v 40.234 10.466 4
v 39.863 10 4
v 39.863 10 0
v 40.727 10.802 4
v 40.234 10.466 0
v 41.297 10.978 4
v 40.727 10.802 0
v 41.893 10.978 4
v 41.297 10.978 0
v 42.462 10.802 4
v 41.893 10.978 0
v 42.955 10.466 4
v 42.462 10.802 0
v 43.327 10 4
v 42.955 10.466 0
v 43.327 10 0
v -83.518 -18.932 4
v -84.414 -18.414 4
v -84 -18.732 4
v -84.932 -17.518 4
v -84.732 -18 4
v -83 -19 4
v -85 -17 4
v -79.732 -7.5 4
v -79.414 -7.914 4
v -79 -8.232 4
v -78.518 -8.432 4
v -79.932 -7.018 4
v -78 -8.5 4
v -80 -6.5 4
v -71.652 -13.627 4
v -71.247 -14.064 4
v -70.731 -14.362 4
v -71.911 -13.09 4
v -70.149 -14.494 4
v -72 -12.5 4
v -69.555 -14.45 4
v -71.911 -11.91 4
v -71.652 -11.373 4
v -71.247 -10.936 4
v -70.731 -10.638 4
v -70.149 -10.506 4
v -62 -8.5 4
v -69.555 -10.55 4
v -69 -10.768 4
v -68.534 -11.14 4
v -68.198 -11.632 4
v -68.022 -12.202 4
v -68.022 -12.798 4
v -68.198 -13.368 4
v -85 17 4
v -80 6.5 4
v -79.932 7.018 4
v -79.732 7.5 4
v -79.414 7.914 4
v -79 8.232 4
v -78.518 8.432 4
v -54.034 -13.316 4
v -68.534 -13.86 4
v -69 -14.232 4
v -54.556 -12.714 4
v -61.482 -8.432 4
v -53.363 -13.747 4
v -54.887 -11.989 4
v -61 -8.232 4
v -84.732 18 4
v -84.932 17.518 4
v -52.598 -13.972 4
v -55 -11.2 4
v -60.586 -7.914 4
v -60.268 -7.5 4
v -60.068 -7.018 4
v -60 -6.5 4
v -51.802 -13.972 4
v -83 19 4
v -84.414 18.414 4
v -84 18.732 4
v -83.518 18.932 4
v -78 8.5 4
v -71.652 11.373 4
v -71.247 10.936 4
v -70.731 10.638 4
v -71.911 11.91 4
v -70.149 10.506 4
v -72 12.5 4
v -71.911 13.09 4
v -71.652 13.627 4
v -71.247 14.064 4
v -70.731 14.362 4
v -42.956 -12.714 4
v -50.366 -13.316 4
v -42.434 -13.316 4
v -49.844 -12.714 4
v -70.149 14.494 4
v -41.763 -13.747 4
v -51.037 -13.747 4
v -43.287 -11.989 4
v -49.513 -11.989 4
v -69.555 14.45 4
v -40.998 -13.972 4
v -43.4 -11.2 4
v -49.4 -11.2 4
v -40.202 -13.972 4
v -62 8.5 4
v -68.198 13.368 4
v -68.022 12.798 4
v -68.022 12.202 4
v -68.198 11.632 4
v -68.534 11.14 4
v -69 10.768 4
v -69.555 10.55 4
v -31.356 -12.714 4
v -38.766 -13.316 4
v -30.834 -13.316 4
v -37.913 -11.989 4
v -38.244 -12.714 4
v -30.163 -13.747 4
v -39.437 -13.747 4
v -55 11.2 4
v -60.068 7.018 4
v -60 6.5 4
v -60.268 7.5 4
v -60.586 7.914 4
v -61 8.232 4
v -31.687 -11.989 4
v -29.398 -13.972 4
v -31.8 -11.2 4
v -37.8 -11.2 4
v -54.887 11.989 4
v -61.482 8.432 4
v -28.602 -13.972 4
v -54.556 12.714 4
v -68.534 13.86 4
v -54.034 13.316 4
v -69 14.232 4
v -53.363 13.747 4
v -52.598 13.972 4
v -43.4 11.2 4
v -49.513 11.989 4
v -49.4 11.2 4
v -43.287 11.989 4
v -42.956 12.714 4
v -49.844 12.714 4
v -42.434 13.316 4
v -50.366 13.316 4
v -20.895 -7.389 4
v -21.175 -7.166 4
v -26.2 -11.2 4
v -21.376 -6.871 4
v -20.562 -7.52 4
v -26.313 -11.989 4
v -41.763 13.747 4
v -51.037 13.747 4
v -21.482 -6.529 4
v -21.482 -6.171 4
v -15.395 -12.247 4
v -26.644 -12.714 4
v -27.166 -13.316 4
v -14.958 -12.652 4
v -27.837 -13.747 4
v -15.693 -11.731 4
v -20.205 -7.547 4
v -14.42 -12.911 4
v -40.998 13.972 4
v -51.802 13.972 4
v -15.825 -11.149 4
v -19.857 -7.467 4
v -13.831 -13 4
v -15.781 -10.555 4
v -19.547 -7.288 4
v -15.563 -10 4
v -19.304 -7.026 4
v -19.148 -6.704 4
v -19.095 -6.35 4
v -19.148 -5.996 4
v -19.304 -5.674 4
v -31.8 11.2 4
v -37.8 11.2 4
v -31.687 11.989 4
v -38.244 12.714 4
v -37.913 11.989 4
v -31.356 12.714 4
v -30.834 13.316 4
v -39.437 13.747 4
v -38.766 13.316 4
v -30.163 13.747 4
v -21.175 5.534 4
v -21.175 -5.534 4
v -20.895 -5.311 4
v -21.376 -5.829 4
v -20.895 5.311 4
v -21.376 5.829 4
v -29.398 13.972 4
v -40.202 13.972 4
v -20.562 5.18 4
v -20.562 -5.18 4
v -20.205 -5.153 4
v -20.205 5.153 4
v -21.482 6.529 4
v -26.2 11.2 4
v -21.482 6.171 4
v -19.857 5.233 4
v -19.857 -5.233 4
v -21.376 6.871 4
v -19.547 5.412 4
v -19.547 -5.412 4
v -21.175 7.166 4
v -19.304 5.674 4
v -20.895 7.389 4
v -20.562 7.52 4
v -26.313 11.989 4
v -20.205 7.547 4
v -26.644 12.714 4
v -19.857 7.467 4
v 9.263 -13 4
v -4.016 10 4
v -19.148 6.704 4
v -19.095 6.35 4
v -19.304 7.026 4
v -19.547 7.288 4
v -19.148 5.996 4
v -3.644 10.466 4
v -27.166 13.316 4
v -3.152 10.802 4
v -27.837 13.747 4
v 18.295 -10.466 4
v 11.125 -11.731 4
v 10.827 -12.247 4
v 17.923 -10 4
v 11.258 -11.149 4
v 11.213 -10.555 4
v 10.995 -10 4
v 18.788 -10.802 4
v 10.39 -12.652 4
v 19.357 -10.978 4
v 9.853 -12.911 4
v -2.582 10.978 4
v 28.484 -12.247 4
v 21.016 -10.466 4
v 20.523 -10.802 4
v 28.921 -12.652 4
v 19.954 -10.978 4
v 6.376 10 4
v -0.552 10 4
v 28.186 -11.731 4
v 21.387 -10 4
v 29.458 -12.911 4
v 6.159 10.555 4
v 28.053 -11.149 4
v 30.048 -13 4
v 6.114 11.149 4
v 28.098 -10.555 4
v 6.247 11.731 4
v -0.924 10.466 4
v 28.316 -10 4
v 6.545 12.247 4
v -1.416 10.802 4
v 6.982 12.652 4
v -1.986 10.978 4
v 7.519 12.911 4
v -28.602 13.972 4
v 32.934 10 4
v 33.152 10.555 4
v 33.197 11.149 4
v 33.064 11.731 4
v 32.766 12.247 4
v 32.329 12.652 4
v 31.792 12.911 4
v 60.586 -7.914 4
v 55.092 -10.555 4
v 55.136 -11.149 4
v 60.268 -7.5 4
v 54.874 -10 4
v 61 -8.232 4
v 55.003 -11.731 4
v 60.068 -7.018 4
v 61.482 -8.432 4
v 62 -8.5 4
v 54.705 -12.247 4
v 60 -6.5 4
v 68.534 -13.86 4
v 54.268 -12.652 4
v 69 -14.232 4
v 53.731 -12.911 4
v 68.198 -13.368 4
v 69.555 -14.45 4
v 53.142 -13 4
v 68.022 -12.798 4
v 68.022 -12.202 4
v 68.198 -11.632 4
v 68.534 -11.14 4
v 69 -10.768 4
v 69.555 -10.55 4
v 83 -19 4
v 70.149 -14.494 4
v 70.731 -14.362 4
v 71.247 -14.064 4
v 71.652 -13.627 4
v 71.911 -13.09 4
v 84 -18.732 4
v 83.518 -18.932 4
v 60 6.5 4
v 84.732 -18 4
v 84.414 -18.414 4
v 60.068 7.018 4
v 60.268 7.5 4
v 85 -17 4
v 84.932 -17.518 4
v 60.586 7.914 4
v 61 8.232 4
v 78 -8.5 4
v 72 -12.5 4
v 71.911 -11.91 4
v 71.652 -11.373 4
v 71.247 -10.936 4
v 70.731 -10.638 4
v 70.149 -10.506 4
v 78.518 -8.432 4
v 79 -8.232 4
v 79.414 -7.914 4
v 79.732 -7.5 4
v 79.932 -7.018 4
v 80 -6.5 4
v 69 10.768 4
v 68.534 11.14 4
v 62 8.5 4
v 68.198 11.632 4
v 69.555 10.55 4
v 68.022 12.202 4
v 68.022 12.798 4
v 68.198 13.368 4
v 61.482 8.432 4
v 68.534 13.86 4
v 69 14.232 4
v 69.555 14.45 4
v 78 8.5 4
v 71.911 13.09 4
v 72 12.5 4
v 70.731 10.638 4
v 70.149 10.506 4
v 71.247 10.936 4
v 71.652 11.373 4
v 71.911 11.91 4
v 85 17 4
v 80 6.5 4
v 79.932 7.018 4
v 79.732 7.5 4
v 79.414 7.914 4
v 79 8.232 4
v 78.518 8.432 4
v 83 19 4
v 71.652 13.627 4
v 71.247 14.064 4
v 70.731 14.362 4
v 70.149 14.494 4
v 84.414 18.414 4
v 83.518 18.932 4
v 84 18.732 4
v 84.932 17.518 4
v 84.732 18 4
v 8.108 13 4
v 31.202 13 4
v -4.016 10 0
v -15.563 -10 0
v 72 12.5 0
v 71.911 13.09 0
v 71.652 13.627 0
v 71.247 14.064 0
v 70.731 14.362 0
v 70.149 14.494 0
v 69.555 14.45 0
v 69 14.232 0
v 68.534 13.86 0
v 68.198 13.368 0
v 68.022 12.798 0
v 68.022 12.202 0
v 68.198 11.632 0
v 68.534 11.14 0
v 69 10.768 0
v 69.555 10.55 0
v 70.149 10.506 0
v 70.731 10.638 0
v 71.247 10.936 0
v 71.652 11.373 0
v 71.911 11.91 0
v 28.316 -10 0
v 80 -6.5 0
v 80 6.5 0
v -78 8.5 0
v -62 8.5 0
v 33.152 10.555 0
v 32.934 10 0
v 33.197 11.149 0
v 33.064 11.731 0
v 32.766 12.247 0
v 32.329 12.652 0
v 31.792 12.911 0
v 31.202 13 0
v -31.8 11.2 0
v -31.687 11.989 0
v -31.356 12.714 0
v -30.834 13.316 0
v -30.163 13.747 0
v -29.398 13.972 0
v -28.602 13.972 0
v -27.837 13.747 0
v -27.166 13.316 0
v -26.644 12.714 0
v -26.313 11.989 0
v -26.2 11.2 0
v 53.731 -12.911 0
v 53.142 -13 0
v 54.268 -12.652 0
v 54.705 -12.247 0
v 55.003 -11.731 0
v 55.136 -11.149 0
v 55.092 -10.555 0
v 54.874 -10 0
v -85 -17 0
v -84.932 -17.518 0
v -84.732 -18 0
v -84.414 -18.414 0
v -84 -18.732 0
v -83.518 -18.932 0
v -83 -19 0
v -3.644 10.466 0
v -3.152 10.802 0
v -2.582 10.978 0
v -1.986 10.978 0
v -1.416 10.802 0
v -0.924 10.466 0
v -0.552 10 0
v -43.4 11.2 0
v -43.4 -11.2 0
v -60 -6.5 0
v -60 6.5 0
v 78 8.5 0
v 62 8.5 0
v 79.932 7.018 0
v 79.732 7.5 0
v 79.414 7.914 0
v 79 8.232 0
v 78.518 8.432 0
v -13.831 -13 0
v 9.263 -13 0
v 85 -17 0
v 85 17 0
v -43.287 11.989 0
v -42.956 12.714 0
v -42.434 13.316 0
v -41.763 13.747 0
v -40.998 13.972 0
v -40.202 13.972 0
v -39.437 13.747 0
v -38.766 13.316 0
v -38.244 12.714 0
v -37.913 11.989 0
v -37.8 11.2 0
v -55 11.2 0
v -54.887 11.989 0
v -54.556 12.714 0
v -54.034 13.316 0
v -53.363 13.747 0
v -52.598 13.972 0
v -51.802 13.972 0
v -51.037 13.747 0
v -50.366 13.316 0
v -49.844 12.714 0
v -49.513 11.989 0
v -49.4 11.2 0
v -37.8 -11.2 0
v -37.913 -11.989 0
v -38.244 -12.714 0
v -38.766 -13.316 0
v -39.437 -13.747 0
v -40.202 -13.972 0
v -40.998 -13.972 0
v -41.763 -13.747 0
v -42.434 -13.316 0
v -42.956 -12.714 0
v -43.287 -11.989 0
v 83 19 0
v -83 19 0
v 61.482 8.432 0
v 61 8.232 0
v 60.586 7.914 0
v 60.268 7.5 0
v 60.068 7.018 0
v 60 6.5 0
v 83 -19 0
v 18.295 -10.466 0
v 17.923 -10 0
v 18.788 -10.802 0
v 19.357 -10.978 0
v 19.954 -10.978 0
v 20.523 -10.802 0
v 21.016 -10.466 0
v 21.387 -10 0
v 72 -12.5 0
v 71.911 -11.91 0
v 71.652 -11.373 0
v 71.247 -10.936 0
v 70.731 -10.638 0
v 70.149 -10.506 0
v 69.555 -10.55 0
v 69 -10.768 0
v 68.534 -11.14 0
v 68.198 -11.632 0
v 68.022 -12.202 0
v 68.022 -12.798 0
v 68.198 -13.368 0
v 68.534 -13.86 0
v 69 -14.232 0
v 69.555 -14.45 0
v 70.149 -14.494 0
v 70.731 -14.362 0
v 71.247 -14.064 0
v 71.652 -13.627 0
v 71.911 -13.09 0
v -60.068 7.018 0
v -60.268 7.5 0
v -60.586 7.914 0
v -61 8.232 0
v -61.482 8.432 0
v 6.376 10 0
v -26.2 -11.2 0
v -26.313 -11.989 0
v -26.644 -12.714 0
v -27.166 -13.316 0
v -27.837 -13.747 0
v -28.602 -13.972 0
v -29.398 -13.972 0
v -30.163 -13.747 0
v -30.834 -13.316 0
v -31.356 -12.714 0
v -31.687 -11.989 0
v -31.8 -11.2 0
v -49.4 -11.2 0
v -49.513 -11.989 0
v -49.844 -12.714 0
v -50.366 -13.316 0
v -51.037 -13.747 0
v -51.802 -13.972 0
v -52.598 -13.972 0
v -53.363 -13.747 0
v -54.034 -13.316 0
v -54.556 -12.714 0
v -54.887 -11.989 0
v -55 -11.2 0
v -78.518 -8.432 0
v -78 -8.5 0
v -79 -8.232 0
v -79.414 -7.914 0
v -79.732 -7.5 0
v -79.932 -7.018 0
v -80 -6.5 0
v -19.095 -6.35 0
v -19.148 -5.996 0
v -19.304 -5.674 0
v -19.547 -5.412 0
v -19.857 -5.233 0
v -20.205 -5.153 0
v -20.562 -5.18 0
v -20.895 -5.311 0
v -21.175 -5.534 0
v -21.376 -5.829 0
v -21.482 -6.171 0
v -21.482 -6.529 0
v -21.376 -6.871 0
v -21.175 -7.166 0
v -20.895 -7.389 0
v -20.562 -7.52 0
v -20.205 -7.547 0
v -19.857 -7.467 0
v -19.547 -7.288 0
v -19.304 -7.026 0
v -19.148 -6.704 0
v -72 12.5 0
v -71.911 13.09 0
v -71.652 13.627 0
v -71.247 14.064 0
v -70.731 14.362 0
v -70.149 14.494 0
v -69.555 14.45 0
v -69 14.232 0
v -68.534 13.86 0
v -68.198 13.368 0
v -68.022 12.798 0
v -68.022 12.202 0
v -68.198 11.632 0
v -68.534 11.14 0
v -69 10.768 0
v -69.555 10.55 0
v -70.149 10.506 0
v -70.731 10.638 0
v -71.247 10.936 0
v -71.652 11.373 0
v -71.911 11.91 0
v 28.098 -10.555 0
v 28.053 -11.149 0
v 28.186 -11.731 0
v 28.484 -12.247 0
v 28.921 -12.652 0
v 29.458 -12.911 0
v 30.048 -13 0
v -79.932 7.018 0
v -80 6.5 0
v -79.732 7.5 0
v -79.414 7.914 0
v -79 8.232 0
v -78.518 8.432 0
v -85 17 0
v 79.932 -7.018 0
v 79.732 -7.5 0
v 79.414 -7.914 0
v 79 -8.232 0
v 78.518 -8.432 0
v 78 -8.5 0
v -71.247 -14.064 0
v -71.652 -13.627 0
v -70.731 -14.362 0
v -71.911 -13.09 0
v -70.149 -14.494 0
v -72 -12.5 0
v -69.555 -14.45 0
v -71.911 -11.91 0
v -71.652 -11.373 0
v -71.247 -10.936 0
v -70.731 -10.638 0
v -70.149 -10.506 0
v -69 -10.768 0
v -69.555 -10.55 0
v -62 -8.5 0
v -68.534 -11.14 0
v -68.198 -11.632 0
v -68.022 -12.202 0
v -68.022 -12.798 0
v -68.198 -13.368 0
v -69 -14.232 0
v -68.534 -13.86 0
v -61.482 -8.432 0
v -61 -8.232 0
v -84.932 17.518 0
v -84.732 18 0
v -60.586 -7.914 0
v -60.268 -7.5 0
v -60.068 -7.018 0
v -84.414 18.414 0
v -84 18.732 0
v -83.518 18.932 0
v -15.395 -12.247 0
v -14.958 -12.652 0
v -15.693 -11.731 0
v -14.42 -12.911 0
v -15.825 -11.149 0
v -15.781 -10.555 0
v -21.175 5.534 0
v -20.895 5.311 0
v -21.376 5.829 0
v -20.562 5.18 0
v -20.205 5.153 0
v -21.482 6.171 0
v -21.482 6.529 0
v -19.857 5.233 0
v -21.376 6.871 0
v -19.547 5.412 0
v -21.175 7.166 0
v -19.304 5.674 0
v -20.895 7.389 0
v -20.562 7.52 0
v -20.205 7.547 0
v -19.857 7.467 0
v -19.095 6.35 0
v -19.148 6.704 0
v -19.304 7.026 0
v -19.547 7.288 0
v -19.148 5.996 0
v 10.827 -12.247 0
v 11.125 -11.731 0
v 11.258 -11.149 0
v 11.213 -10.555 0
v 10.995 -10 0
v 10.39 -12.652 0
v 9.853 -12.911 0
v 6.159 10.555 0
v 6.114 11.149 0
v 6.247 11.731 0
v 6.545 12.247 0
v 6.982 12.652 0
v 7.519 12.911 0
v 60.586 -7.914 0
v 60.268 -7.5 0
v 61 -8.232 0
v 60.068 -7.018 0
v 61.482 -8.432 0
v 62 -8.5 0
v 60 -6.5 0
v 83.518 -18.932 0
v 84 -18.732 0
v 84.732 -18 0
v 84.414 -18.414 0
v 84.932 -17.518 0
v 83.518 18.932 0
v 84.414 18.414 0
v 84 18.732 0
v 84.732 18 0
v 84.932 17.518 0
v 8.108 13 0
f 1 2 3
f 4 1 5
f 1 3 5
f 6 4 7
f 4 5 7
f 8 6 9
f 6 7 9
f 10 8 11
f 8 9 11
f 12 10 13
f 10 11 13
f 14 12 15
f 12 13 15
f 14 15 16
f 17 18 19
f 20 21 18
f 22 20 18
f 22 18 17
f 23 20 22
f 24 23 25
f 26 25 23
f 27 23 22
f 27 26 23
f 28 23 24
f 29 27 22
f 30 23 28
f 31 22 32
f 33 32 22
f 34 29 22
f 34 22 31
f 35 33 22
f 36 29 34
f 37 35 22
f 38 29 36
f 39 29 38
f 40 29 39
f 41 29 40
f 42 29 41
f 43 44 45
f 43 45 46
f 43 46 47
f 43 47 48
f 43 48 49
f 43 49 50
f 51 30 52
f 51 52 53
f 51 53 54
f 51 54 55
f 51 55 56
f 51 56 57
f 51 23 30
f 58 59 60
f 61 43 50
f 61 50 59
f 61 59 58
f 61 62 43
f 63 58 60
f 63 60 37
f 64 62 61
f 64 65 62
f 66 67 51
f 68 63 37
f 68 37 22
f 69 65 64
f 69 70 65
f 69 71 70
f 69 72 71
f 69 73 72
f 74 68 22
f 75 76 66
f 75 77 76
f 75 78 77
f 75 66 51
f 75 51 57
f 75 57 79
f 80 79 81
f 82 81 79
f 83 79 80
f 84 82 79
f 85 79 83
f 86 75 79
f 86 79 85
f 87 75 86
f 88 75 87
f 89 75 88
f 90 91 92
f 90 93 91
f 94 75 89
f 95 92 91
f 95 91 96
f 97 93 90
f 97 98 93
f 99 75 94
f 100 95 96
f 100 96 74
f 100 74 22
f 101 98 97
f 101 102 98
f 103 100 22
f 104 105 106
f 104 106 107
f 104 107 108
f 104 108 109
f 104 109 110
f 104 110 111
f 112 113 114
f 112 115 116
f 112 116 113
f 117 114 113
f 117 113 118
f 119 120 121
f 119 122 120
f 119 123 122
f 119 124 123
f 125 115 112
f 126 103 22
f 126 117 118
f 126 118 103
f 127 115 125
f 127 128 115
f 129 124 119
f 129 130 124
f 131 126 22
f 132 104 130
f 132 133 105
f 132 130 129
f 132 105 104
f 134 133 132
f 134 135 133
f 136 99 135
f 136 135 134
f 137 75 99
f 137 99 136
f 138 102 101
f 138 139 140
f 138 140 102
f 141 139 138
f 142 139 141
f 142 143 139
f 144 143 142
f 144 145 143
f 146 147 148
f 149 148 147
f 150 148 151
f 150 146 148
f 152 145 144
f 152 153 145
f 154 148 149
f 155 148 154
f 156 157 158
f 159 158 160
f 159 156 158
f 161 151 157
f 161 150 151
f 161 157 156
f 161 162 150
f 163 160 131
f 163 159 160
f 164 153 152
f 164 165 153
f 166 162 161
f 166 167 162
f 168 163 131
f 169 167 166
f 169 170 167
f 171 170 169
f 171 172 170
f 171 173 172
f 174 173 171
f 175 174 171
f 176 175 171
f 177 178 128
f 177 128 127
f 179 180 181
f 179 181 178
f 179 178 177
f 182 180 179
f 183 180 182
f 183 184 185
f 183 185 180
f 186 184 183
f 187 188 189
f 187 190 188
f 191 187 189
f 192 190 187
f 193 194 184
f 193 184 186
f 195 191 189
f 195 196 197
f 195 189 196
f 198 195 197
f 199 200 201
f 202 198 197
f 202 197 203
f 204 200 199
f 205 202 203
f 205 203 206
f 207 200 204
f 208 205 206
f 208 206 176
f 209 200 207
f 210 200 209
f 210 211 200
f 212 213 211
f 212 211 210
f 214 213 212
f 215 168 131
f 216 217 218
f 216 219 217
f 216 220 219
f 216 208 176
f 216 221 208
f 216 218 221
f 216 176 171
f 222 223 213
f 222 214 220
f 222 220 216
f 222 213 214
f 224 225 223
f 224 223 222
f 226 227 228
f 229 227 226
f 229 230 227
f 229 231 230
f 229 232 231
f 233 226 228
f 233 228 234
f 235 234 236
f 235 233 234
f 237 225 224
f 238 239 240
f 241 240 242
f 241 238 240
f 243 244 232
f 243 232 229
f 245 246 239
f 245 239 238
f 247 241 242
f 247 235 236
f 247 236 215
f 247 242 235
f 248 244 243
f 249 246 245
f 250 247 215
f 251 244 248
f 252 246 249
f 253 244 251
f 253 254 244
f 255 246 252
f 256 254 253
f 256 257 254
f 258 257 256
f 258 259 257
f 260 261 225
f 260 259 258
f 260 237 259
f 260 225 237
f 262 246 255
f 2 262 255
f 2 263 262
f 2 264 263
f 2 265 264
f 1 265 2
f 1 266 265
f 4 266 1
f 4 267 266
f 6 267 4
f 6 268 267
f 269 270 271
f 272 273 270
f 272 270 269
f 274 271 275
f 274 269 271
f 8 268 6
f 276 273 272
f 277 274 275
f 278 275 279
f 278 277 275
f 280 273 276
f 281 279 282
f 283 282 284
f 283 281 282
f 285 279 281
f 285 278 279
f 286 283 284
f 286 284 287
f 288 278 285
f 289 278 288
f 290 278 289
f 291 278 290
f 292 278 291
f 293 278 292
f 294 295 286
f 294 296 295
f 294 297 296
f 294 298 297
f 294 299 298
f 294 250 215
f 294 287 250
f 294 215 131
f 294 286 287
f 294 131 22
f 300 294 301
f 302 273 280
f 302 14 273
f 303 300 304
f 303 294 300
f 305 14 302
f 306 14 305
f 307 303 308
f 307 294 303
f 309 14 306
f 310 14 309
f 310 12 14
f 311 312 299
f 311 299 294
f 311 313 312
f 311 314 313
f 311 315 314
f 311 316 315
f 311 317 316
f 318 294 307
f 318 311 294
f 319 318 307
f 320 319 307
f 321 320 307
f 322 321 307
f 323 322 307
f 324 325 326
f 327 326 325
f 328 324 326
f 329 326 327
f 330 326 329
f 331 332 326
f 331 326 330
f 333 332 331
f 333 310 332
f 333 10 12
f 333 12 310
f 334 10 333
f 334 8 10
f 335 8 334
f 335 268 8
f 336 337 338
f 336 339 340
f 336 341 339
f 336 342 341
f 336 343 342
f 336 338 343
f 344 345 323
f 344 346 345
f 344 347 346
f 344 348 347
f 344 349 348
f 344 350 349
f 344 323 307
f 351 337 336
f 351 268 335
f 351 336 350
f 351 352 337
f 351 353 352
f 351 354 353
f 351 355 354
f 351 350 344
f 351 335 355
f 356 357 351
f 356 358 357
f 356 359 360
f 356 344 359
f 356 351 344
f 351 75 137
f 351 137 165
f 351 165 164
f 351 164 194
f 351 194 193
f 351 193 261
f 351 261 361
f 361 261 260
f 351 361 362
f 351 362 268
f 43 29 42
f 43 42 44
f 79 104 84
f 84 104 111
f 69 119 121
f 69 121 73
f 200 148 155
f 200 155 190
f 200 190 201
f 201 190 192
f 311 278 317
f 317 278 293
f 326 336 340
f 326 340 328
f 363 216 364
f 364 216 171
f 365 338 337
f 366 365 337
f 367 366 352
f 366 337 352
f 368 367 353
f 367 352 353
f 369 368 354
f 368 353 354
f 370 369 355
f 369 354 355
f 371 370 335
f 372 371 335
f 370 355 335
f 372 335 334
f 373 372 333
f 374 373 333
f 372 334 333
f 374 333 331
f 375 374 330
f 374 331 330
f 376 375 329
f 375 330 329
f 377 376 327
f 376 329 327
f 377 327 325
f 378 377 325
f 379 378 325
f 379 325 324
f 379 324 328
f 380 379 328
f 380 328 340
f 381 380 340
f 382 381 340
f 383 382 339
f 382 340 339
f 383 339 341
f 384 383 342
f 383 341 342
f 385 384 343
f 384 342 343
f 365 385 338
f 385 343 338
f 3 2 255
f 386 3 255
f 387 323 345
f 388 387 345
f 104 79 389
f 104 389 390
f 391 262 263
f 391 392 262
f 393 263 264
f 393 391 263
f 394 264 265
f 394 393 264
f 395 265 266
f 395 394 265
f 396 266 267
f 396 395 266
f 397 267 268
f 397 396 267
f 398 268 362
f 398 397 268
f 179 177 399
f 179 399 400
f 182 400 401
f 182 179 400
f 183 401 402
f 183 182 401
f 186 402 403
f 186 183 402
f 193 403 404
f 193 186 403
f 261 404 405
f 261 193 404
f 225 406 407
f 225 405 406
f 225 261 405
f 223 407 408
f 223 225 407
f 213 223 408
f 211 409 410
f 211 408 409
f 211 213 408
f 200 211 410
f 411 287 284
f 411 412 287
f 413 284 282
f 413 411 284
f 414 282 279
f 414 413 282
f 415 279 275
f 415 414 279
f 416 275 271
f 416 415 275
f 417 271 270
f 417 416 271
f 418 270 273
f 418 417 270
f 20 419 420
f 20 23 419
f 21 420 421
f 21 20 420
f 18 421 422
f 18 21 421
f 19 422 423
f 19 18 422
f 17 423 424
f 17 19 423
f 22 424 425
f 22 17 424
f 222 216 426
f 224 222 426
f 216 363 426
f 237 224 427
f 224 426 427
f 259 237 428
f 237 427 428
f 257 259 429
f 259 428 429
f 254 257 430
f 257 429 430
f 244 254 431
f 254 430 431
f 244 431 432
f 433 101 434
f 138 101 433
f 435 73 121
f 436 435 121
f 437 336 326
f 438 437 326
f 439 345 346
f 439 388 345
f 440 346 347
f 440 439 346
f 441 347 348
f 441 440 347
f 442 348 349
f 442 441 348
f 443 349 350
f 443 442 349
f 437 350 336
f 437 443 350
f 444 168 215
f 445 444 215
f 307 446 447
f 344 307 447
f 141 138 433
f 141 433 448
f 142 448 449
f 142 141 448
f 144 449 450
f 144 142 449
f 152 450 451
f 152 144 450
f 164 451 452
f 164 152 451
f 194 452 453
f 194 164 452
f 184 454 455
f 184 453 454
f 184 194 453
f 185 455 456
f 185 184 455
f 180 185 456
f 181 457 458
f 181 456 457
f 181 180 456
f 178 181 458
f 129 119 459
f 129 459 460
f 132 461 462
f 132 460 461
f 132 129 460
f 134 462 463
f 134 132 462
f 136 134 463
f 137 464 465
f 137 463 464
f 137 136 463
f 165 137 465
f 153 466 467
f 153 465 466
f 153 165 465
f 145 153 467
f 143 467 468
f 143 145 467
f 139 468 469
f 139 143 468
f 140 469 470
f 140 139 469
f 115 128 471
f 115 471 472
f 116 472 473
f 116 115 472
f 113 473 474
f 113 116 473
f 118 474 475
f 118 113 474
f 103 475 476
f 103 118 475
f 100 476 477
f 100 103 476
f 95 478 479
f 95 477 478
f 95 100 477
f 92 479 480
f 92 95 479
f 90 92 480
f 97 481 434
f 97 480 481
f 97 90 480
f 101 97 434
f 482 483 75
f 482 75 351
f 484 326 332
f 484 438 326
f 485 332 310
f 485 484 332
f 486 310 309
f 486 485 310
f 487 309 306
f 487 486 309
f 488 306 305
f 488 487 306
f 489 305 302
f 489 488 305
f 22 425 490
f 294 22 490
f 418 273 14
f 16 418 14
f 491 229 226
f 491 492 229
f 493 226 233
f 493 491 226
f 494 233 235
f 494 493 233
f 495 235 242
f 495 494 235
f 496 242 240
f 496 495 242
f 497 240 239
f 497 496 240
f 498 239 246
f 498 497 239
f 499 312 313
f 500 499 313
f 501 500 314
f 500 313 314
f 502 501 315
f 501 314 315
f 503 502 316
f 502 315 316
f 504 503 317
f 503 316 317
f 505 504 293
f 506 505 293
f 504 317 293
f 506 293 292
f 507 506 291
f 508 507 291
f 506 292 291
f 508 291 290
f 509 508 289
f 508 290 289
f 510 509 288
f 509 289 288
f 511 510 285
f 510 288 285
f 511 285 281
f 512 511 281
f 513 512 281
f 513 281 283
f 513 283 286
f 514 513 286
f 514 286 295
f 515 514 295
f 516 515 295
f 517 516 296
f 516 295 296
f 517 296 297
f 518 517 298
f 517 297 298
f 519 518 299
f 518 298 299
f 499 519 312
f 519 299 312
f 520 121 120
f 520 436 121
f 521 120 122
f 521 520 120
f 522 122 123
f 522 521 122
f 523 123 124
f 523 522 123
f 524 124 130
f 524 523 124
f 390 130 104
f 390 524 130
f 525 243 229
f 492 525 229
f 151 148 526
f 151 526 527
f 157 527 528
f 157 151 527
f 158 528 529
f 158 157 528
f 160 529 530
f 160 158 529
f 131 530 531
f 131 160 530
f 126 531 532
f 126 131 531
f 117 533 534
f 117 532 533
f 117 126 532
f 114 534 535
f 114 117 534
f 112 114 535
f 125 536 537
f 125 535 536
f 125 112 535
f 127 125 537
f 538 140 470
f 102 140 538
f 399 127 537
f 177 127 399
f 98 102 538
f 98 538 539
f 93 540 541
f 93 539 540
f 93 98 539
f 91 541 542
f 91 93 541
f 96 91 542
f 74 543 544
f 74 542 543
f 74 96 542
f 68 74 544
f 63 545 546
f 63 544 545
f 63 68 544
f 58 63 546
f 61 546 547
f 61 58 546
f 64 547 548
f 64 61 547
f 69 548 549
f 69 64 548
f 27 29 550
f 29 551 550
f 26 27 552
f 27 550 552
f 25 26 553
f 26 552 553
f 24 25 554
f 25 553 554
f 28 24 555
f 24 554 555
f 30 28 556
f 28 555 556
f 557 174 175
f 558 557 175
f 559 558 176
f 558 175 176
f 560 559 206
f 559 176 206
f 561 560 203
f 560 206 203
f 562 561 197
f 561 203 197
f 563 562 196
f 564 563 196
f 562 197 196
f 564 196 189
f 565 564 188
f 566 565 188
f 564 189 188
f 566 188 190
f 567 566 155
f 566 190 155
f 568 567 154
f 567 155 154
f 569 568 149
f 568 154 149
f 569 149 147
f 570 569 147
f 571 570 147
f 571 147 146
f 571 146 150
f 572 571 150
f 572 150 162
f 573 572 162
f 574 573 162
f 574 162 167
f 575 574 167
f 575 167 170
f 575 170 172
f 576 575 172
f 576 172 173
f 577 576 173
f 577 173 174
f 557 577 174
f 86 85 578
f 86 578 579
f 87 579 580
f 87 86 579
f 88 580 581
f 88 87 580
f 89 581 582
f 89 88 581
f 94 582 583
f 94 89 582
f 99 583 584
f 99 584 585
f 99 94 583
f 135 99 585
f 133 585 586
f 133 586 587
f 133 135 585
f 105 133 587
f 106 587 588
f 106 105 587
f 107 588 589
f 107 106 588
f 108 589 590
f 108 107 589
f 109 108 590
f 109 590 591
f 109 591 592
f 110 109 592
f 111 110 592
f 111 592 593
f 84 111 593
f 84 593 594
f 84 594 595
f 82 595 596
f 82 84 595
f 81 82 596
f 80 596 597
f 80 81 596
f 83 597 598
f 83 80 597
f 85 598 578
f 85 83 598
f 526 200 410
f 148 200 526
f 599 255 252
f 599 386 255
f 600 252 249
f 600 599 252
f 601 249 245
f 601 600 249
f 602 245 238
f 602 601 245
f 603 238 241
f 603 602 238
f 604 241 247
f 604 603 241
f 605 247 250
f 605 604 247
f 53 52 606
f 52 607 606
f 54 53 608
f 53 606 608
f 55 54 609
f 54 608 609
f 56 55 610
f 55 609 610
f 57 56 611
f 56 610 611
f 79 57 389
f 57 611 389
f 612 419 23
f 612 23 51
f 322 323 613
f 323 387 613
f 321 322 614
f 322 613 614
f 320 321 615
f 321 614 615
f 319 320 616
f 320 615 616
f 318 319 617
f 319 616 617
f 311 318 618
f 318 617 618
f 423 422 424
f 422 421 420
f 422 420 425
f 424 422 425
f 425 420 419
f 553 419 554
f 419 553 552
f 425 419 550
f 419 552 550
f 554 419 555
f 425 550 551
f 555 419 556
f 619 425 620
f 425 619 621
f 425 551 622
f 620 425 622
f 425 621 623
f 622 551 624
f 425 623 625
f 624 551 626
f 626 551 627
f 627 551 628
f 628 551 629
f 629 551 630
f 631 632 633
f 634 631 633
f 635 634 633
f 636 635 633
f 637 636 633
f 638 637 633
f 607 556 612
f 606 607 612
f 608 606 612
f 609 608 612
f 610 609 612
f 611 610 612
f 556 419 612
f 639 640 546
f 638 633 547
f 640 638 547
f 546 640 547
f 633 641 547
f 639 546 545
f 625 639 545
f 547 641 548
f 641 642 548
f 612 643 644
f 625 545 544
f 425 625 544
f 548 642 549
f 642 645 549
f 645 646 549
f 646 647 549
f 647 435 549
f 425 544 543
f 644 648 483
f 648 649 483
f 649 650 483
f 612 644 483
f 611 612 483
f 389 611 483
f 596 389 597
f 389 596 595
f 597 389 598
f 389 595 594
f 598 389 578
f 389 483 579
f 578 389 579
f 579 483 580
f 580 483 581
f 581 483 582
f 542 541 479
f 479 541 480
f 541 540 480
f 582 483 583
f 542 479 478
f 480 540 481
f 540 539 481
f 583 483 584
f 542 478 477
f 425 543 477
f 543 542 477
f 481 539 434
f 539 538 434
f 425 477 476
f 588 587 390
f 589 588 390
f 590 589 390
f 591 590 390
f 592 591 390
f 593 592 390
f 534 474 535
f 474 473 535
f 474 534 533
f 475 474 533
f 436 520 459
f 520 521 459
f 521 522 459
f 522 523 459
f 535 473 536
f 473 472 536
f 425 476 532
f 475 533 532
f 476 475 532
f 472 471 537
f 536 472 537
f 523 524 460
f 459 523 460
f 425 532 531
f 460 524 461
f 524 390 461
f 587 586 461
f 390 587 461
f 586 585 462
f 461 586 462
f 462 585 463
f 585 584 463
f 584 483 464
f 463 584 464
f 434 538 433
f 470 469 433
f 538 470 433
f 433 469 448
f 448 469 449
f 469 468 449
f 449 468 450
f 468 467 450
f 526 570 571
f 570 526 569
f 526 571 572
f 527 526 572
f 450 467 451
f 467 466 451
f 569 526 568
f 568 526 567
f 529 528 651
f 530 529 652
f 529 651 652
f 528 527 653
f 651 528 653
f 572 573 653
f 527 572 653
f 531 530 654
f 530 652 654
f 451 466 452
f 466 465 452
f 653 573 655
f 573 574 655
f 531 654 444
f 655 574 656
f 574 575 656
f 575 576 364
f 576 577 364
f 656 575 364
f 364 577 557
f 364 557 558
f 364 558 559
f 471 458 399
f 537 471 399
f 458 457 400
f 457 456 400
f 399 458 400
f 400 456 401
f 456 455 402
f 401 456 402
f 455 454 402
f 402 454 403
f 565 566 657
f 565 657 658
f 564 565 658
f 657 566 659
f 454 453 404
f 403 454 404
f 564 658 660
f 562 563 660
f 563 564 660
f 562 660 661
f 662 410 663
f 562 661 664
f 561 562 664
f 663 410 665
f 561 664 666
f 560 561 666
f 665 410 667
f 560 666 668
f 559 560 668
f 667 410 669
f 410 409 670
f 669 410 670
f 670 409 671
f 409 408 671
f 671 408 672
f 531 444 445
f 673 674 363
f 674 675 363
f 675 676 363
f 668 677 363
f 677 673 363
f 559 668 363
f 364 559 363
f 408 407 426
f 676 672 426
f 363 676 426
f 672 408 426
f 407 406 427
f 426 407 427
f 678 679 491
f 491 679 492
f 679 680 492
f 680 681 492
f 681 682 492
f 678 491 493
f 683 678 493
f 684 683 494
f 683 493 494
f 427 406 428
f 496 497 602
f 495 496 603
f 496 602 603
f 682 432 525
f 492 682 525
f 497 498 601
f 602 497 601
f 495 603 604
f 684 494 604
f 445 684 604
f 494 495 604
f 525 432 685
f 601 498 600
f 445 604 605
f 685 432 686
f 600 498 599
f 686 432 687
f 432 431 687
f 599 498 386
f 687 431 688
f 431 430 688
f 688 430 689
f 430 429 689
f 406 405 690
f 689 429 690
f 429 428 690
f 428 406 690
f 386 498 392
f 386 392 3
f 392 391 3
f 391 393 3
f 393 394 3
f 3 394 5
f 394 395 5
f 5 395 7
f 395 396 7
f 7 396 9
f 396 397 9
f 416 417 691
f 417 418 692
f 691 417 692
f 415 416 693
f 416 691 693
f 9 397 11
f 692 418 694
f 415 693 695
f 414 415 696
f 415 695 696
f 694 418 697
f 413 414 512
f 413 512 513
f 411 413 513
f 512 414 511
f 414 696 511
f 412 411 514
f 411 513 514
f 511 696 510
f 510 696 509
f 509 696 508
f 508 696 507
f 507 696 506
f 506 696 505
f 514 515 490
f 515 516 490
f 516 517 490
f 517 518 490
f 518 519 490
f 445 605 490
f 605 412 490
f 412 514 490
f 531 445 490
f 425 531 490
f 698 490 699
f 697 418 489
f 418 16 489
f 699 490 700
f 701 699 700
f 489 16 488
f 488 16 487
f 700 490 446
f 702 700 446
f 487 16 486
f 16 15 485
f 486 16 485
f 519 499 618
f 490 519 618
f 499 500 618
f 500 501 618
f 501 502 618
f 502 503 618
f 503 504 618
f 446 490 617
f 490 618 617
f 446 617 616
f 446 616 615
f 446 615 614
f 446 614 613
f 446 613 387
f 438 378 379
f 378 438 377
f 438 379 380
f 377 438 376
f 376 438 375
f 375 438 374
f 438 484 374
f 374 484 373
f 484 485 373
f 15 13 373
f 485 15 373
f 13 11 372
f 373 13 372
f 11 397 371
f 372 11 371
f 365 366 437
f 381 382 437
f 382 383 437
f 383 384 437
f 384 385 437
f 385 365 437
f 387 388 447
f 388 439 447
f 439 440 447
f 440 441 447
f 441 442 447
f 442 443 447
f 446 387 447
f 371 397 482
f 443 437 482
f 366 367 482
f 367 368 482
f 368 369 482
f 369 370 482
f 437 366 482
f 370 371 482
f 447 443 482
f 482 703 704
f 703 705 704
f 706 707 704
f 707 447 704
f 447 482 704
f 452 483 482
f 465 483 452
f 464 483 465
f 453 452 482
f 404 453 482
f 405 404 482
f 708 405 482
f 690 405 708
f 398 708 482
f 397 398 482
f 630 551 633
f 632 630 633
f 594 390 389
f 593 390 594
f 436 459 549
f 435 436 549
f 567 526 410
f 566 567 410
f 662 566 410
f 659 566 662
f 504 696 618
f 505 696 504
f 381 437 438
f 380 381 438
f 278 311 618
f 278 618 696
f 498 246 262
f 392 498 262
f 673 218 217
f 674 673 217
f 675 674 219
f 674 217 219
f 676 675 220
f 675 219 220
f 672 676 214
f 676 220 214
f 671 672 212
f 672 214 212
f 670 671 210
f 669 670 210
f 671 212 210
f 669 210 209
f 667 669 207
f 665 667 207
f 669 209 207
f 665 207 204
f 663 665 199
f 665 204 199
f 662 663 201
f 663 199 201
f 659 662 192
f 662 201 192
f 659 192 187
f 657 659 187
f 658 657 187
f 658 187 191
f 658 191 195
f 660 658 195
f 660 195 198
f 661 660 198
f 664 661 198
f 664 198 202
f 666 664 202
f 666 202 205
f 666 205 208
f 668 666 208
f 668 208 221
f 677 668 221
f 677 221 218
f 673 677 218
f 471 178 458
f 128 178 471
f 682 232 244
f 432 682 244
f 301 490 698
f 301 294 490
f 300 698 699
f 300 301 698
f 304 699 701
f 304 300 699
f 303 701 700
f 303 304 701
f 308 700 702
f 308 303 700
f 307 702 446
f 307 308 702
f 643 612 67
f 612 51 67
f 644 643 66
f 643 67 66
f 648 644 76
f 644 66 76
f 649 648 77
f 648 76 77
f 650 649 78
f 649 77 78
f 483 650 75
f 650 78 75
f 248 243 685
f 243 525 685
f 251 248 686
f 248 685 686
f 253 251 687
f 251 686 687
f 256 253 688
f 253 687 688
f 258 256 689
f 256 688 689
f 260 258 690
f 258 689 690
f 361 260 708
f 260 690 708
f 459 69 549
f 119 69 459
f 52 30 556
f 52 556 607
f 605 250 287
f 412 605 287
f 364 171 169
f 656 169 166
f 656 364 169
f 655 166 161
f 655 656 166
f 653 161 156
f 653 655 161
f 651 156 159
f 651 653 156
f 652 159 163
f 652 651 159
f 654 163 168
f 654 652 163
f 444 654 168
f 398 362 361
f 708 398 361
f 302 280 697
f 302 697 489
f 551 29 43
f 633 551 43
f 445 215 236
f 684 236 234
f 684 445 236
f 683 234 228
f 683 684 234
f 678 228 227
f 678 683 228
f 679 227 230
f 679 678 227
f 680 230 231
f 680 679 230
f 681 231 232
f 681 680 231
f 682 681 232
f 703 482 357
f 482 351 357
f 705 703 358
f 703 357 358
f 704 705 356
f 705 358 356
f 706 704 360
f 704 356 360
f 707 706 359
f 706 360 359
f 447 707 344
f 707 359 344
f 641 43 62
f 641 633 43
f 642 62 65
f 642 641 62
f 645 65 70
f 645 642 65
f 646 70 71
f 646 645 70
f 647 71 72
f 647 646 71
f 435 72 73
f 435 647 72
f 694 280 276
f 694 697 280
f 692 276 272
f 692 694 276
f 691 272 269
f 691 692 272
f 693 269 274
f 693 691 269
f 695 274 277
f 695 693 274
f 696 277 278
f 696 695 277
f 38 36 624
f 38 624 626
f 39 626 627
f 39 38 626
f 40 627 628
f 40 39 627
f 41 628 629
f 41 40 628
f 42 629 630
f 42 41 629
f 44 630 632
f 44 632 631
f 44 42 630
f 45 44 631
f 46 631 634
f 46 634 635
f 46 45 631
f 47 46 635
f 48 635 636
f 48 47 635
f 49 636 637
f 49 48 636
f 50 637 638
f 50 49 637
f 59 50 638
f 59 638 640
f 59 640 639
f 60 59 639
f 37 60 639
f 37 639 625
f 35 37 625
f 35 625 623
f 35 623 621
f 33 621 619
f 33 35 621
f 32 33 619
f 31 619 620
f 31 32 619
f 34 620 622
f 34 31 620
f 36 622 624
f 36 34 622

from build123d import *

# Parameters (mm, degrees)
SKETCH_1_W          = 170
SKETCH_1_H          = 38
EXTRUDE_1_DEPTH     = 4
SKETCH_2_R          = 2
CUT_EXTRUDE_1_DEPTH = 4
SKETCH_3_R          = 1.2
CUT_EXTRUDE_2_DEPTH = 10
SKETCH_4_W          = 20
SKETCH_4_H          = 17
CUT_EXTRUDE_3_DEPTH = 10
FILLET_1_R          = 2
FILLET_2_R          = 2
CUT_EXTRUDE_4_DEPTH = 10
FILLET_3_R          = 2
CUT_EXTRUDE_5_DEPTH = 10


with BuildPart() as part:
    # 草图1 → 凸台-拉伸1 (new body)
    with BuildSketch(Plane.XY):
        Rectangle(SKETCH_1_W, SKETCH_1_H)
    extrude(amount=EXTRUDE_1_DEPTH)

    # 草图2 → 切除-拉伸1 (cut)
    with BuildSketch(Plane.XY.offset(4)):
        with Locations((70, 12.5)):
            Circle(SKETCH_2_R)
        with Locations((70, -12.5)):
            Circle(SKETCH_2_R)
    cut_extrude_1 = extrude(amount=-CUT_EXTRUDE_1_DEPTH, mode=Mode.SUBTRACT)

    # 镜向1: 切除-拉伸1 across plane
    add(cut_extrude_1.mirror(Plane(origin=(0, 0, 0), x_dir=(0, 0, 1), z_dir=(1, 0, 0))), mode=Mode.SUBTRACT)

    # 草图3 → 切除-拉伸2 (cut)
    with BuildSketch(Plane.XY.offset(4)):
        with Locations((-20.295, 6.35)):
            Circle(SKETCH_3_R)
        with Locations((-20.295, -6.35)):
            Circle(SKETCH_3_R)
    extrude(amount=-CUT_EXTRUDE_2_DEPTH, mode=Mode.SUBTRACT)

    # 草图4 → 切除-拉伸3 (cut)
    with BuildSketch(Plane.XY.offset(4)):
        with Locations((-70, 0)):
            Rectangle(SKETCH_4_W, SKETCH_4_H)
    cut_extrude_3 = extrude(amount=-CUT_EXTRUDE_3_DEPTH, mode=Mode.SUBTRACT)

    # 镜向2: 切除-拉伸3 across plane
    add(cut_extrude_3.mirror(Plane(origin=(0, 0, 0), x_dir=(0, 0, 1), z_dir=(1, 0, 0))), mode=Mode.SUBTRACT)

    # 圆角1
    fillet_1_edges = [part.edges().sort_by_distance(p)[0] for p in [
        (-60, 8.5, 2),
        (-60, -8.5, 2),
        (-80, -8.5, 2),
        (-80, 8.5, 2),
        (60, -8.5, 2),
        (60, 8.5, 2),
        (80, 8.5, 2),
        (80, -8.5, 2),
    ]]
    fillet(fillet_1_edges, radius=FILLET_1_R)

    # 圆角2
    fillet_2_edges = [part.edges().sort_by_distance(p)[0] for p in [
        (85, -19, 2),
        (-85, -19, 2),
        (-85, 19, 2),
        (85, 19, 2),
    ]]
    fillet(fillet_2_edges, radius=FILLET_2_R)

    # 草图5 → 切除-拉伸4 (cut)
    with BuildSketch(Plane.XY.offset(4)):
        Polygon((-2.283893001, 13), (-17.295, -13), (12.727213998, -13), align=None)
        Polygon((4.644310229, 13), (19.655417228, -13), (34.666524227, 13), align=None)
        Polygon((41.594727457, 13), (26.583620458, -13), (56.605834456, -13), align=None)
    extrude(amount=-CUT_EXTRUDE_4_DEPTH, mode=Mode.SUBTRACT)

    # 圆角3
    fillet_3_edges = [part.edges().sort_by_distance(p)[0] for p in [
        (4.644310229, 13, 2),
        (34.666524227, 13, 2),
        (19.655417228, -13, 2),
        (41.594727457, 13, 2),
        (56.605834456, -13, 2),
        (26.583620458, -13, 2),
        (-2.283893001, 13, 2),
        (12.727213998, -13, 2),
        (-17.295, -13, 2),
    ]]
    fillet(fillet_3_edges, radius=FILLET_3_R)

    # 草图6 → 切除-拉伸5 (cut)
    with BuildSketch(Plane.XY.offset(4)):
        with BuildLine():
            Line((-55, -11.2), (-55, 11.2))
            ThreePointArc((-55, 11.2), (-52.2, 14), (-49.4, 11.2))
            Line((-49.4, 11.2), (-49.4, -11.2))
            ThreePointArc((-49.4, -11.2), (-52.2, -14), (-55, -11.2))
        make_face()
        with BuildLine():
            Line((-43.4, -11.2), (-43.4, 11.2))
            ThreePointArc((-43.4, 11.2), (-40.6, 14), (-37.8, 11.2))
            Line((-37.8, 11.2), (-37.8, -11.2))
            ThreePointArc((-37.8, -11.2), (-40.6, -14), (-43.4, -11.2))
        make_face()
        with BuildLine():
            Line((-31.8, -11.2), (-31.8, 11.2))
            ThreePointArc((-31.8, 11.2), (-29, 14), (-26.2, 11.2))
            Line((-26.2, 11.2), (-26.2, -11.2))
            ThreePointArc((-26.2, -11.2), (-29, -14), (-31.8, -11.2))
        make_face()
    extrude(amount=-CUT_EXTRUDE_5_DEPTH, mode=Mode.SUBTRACT)


solid = part.part
